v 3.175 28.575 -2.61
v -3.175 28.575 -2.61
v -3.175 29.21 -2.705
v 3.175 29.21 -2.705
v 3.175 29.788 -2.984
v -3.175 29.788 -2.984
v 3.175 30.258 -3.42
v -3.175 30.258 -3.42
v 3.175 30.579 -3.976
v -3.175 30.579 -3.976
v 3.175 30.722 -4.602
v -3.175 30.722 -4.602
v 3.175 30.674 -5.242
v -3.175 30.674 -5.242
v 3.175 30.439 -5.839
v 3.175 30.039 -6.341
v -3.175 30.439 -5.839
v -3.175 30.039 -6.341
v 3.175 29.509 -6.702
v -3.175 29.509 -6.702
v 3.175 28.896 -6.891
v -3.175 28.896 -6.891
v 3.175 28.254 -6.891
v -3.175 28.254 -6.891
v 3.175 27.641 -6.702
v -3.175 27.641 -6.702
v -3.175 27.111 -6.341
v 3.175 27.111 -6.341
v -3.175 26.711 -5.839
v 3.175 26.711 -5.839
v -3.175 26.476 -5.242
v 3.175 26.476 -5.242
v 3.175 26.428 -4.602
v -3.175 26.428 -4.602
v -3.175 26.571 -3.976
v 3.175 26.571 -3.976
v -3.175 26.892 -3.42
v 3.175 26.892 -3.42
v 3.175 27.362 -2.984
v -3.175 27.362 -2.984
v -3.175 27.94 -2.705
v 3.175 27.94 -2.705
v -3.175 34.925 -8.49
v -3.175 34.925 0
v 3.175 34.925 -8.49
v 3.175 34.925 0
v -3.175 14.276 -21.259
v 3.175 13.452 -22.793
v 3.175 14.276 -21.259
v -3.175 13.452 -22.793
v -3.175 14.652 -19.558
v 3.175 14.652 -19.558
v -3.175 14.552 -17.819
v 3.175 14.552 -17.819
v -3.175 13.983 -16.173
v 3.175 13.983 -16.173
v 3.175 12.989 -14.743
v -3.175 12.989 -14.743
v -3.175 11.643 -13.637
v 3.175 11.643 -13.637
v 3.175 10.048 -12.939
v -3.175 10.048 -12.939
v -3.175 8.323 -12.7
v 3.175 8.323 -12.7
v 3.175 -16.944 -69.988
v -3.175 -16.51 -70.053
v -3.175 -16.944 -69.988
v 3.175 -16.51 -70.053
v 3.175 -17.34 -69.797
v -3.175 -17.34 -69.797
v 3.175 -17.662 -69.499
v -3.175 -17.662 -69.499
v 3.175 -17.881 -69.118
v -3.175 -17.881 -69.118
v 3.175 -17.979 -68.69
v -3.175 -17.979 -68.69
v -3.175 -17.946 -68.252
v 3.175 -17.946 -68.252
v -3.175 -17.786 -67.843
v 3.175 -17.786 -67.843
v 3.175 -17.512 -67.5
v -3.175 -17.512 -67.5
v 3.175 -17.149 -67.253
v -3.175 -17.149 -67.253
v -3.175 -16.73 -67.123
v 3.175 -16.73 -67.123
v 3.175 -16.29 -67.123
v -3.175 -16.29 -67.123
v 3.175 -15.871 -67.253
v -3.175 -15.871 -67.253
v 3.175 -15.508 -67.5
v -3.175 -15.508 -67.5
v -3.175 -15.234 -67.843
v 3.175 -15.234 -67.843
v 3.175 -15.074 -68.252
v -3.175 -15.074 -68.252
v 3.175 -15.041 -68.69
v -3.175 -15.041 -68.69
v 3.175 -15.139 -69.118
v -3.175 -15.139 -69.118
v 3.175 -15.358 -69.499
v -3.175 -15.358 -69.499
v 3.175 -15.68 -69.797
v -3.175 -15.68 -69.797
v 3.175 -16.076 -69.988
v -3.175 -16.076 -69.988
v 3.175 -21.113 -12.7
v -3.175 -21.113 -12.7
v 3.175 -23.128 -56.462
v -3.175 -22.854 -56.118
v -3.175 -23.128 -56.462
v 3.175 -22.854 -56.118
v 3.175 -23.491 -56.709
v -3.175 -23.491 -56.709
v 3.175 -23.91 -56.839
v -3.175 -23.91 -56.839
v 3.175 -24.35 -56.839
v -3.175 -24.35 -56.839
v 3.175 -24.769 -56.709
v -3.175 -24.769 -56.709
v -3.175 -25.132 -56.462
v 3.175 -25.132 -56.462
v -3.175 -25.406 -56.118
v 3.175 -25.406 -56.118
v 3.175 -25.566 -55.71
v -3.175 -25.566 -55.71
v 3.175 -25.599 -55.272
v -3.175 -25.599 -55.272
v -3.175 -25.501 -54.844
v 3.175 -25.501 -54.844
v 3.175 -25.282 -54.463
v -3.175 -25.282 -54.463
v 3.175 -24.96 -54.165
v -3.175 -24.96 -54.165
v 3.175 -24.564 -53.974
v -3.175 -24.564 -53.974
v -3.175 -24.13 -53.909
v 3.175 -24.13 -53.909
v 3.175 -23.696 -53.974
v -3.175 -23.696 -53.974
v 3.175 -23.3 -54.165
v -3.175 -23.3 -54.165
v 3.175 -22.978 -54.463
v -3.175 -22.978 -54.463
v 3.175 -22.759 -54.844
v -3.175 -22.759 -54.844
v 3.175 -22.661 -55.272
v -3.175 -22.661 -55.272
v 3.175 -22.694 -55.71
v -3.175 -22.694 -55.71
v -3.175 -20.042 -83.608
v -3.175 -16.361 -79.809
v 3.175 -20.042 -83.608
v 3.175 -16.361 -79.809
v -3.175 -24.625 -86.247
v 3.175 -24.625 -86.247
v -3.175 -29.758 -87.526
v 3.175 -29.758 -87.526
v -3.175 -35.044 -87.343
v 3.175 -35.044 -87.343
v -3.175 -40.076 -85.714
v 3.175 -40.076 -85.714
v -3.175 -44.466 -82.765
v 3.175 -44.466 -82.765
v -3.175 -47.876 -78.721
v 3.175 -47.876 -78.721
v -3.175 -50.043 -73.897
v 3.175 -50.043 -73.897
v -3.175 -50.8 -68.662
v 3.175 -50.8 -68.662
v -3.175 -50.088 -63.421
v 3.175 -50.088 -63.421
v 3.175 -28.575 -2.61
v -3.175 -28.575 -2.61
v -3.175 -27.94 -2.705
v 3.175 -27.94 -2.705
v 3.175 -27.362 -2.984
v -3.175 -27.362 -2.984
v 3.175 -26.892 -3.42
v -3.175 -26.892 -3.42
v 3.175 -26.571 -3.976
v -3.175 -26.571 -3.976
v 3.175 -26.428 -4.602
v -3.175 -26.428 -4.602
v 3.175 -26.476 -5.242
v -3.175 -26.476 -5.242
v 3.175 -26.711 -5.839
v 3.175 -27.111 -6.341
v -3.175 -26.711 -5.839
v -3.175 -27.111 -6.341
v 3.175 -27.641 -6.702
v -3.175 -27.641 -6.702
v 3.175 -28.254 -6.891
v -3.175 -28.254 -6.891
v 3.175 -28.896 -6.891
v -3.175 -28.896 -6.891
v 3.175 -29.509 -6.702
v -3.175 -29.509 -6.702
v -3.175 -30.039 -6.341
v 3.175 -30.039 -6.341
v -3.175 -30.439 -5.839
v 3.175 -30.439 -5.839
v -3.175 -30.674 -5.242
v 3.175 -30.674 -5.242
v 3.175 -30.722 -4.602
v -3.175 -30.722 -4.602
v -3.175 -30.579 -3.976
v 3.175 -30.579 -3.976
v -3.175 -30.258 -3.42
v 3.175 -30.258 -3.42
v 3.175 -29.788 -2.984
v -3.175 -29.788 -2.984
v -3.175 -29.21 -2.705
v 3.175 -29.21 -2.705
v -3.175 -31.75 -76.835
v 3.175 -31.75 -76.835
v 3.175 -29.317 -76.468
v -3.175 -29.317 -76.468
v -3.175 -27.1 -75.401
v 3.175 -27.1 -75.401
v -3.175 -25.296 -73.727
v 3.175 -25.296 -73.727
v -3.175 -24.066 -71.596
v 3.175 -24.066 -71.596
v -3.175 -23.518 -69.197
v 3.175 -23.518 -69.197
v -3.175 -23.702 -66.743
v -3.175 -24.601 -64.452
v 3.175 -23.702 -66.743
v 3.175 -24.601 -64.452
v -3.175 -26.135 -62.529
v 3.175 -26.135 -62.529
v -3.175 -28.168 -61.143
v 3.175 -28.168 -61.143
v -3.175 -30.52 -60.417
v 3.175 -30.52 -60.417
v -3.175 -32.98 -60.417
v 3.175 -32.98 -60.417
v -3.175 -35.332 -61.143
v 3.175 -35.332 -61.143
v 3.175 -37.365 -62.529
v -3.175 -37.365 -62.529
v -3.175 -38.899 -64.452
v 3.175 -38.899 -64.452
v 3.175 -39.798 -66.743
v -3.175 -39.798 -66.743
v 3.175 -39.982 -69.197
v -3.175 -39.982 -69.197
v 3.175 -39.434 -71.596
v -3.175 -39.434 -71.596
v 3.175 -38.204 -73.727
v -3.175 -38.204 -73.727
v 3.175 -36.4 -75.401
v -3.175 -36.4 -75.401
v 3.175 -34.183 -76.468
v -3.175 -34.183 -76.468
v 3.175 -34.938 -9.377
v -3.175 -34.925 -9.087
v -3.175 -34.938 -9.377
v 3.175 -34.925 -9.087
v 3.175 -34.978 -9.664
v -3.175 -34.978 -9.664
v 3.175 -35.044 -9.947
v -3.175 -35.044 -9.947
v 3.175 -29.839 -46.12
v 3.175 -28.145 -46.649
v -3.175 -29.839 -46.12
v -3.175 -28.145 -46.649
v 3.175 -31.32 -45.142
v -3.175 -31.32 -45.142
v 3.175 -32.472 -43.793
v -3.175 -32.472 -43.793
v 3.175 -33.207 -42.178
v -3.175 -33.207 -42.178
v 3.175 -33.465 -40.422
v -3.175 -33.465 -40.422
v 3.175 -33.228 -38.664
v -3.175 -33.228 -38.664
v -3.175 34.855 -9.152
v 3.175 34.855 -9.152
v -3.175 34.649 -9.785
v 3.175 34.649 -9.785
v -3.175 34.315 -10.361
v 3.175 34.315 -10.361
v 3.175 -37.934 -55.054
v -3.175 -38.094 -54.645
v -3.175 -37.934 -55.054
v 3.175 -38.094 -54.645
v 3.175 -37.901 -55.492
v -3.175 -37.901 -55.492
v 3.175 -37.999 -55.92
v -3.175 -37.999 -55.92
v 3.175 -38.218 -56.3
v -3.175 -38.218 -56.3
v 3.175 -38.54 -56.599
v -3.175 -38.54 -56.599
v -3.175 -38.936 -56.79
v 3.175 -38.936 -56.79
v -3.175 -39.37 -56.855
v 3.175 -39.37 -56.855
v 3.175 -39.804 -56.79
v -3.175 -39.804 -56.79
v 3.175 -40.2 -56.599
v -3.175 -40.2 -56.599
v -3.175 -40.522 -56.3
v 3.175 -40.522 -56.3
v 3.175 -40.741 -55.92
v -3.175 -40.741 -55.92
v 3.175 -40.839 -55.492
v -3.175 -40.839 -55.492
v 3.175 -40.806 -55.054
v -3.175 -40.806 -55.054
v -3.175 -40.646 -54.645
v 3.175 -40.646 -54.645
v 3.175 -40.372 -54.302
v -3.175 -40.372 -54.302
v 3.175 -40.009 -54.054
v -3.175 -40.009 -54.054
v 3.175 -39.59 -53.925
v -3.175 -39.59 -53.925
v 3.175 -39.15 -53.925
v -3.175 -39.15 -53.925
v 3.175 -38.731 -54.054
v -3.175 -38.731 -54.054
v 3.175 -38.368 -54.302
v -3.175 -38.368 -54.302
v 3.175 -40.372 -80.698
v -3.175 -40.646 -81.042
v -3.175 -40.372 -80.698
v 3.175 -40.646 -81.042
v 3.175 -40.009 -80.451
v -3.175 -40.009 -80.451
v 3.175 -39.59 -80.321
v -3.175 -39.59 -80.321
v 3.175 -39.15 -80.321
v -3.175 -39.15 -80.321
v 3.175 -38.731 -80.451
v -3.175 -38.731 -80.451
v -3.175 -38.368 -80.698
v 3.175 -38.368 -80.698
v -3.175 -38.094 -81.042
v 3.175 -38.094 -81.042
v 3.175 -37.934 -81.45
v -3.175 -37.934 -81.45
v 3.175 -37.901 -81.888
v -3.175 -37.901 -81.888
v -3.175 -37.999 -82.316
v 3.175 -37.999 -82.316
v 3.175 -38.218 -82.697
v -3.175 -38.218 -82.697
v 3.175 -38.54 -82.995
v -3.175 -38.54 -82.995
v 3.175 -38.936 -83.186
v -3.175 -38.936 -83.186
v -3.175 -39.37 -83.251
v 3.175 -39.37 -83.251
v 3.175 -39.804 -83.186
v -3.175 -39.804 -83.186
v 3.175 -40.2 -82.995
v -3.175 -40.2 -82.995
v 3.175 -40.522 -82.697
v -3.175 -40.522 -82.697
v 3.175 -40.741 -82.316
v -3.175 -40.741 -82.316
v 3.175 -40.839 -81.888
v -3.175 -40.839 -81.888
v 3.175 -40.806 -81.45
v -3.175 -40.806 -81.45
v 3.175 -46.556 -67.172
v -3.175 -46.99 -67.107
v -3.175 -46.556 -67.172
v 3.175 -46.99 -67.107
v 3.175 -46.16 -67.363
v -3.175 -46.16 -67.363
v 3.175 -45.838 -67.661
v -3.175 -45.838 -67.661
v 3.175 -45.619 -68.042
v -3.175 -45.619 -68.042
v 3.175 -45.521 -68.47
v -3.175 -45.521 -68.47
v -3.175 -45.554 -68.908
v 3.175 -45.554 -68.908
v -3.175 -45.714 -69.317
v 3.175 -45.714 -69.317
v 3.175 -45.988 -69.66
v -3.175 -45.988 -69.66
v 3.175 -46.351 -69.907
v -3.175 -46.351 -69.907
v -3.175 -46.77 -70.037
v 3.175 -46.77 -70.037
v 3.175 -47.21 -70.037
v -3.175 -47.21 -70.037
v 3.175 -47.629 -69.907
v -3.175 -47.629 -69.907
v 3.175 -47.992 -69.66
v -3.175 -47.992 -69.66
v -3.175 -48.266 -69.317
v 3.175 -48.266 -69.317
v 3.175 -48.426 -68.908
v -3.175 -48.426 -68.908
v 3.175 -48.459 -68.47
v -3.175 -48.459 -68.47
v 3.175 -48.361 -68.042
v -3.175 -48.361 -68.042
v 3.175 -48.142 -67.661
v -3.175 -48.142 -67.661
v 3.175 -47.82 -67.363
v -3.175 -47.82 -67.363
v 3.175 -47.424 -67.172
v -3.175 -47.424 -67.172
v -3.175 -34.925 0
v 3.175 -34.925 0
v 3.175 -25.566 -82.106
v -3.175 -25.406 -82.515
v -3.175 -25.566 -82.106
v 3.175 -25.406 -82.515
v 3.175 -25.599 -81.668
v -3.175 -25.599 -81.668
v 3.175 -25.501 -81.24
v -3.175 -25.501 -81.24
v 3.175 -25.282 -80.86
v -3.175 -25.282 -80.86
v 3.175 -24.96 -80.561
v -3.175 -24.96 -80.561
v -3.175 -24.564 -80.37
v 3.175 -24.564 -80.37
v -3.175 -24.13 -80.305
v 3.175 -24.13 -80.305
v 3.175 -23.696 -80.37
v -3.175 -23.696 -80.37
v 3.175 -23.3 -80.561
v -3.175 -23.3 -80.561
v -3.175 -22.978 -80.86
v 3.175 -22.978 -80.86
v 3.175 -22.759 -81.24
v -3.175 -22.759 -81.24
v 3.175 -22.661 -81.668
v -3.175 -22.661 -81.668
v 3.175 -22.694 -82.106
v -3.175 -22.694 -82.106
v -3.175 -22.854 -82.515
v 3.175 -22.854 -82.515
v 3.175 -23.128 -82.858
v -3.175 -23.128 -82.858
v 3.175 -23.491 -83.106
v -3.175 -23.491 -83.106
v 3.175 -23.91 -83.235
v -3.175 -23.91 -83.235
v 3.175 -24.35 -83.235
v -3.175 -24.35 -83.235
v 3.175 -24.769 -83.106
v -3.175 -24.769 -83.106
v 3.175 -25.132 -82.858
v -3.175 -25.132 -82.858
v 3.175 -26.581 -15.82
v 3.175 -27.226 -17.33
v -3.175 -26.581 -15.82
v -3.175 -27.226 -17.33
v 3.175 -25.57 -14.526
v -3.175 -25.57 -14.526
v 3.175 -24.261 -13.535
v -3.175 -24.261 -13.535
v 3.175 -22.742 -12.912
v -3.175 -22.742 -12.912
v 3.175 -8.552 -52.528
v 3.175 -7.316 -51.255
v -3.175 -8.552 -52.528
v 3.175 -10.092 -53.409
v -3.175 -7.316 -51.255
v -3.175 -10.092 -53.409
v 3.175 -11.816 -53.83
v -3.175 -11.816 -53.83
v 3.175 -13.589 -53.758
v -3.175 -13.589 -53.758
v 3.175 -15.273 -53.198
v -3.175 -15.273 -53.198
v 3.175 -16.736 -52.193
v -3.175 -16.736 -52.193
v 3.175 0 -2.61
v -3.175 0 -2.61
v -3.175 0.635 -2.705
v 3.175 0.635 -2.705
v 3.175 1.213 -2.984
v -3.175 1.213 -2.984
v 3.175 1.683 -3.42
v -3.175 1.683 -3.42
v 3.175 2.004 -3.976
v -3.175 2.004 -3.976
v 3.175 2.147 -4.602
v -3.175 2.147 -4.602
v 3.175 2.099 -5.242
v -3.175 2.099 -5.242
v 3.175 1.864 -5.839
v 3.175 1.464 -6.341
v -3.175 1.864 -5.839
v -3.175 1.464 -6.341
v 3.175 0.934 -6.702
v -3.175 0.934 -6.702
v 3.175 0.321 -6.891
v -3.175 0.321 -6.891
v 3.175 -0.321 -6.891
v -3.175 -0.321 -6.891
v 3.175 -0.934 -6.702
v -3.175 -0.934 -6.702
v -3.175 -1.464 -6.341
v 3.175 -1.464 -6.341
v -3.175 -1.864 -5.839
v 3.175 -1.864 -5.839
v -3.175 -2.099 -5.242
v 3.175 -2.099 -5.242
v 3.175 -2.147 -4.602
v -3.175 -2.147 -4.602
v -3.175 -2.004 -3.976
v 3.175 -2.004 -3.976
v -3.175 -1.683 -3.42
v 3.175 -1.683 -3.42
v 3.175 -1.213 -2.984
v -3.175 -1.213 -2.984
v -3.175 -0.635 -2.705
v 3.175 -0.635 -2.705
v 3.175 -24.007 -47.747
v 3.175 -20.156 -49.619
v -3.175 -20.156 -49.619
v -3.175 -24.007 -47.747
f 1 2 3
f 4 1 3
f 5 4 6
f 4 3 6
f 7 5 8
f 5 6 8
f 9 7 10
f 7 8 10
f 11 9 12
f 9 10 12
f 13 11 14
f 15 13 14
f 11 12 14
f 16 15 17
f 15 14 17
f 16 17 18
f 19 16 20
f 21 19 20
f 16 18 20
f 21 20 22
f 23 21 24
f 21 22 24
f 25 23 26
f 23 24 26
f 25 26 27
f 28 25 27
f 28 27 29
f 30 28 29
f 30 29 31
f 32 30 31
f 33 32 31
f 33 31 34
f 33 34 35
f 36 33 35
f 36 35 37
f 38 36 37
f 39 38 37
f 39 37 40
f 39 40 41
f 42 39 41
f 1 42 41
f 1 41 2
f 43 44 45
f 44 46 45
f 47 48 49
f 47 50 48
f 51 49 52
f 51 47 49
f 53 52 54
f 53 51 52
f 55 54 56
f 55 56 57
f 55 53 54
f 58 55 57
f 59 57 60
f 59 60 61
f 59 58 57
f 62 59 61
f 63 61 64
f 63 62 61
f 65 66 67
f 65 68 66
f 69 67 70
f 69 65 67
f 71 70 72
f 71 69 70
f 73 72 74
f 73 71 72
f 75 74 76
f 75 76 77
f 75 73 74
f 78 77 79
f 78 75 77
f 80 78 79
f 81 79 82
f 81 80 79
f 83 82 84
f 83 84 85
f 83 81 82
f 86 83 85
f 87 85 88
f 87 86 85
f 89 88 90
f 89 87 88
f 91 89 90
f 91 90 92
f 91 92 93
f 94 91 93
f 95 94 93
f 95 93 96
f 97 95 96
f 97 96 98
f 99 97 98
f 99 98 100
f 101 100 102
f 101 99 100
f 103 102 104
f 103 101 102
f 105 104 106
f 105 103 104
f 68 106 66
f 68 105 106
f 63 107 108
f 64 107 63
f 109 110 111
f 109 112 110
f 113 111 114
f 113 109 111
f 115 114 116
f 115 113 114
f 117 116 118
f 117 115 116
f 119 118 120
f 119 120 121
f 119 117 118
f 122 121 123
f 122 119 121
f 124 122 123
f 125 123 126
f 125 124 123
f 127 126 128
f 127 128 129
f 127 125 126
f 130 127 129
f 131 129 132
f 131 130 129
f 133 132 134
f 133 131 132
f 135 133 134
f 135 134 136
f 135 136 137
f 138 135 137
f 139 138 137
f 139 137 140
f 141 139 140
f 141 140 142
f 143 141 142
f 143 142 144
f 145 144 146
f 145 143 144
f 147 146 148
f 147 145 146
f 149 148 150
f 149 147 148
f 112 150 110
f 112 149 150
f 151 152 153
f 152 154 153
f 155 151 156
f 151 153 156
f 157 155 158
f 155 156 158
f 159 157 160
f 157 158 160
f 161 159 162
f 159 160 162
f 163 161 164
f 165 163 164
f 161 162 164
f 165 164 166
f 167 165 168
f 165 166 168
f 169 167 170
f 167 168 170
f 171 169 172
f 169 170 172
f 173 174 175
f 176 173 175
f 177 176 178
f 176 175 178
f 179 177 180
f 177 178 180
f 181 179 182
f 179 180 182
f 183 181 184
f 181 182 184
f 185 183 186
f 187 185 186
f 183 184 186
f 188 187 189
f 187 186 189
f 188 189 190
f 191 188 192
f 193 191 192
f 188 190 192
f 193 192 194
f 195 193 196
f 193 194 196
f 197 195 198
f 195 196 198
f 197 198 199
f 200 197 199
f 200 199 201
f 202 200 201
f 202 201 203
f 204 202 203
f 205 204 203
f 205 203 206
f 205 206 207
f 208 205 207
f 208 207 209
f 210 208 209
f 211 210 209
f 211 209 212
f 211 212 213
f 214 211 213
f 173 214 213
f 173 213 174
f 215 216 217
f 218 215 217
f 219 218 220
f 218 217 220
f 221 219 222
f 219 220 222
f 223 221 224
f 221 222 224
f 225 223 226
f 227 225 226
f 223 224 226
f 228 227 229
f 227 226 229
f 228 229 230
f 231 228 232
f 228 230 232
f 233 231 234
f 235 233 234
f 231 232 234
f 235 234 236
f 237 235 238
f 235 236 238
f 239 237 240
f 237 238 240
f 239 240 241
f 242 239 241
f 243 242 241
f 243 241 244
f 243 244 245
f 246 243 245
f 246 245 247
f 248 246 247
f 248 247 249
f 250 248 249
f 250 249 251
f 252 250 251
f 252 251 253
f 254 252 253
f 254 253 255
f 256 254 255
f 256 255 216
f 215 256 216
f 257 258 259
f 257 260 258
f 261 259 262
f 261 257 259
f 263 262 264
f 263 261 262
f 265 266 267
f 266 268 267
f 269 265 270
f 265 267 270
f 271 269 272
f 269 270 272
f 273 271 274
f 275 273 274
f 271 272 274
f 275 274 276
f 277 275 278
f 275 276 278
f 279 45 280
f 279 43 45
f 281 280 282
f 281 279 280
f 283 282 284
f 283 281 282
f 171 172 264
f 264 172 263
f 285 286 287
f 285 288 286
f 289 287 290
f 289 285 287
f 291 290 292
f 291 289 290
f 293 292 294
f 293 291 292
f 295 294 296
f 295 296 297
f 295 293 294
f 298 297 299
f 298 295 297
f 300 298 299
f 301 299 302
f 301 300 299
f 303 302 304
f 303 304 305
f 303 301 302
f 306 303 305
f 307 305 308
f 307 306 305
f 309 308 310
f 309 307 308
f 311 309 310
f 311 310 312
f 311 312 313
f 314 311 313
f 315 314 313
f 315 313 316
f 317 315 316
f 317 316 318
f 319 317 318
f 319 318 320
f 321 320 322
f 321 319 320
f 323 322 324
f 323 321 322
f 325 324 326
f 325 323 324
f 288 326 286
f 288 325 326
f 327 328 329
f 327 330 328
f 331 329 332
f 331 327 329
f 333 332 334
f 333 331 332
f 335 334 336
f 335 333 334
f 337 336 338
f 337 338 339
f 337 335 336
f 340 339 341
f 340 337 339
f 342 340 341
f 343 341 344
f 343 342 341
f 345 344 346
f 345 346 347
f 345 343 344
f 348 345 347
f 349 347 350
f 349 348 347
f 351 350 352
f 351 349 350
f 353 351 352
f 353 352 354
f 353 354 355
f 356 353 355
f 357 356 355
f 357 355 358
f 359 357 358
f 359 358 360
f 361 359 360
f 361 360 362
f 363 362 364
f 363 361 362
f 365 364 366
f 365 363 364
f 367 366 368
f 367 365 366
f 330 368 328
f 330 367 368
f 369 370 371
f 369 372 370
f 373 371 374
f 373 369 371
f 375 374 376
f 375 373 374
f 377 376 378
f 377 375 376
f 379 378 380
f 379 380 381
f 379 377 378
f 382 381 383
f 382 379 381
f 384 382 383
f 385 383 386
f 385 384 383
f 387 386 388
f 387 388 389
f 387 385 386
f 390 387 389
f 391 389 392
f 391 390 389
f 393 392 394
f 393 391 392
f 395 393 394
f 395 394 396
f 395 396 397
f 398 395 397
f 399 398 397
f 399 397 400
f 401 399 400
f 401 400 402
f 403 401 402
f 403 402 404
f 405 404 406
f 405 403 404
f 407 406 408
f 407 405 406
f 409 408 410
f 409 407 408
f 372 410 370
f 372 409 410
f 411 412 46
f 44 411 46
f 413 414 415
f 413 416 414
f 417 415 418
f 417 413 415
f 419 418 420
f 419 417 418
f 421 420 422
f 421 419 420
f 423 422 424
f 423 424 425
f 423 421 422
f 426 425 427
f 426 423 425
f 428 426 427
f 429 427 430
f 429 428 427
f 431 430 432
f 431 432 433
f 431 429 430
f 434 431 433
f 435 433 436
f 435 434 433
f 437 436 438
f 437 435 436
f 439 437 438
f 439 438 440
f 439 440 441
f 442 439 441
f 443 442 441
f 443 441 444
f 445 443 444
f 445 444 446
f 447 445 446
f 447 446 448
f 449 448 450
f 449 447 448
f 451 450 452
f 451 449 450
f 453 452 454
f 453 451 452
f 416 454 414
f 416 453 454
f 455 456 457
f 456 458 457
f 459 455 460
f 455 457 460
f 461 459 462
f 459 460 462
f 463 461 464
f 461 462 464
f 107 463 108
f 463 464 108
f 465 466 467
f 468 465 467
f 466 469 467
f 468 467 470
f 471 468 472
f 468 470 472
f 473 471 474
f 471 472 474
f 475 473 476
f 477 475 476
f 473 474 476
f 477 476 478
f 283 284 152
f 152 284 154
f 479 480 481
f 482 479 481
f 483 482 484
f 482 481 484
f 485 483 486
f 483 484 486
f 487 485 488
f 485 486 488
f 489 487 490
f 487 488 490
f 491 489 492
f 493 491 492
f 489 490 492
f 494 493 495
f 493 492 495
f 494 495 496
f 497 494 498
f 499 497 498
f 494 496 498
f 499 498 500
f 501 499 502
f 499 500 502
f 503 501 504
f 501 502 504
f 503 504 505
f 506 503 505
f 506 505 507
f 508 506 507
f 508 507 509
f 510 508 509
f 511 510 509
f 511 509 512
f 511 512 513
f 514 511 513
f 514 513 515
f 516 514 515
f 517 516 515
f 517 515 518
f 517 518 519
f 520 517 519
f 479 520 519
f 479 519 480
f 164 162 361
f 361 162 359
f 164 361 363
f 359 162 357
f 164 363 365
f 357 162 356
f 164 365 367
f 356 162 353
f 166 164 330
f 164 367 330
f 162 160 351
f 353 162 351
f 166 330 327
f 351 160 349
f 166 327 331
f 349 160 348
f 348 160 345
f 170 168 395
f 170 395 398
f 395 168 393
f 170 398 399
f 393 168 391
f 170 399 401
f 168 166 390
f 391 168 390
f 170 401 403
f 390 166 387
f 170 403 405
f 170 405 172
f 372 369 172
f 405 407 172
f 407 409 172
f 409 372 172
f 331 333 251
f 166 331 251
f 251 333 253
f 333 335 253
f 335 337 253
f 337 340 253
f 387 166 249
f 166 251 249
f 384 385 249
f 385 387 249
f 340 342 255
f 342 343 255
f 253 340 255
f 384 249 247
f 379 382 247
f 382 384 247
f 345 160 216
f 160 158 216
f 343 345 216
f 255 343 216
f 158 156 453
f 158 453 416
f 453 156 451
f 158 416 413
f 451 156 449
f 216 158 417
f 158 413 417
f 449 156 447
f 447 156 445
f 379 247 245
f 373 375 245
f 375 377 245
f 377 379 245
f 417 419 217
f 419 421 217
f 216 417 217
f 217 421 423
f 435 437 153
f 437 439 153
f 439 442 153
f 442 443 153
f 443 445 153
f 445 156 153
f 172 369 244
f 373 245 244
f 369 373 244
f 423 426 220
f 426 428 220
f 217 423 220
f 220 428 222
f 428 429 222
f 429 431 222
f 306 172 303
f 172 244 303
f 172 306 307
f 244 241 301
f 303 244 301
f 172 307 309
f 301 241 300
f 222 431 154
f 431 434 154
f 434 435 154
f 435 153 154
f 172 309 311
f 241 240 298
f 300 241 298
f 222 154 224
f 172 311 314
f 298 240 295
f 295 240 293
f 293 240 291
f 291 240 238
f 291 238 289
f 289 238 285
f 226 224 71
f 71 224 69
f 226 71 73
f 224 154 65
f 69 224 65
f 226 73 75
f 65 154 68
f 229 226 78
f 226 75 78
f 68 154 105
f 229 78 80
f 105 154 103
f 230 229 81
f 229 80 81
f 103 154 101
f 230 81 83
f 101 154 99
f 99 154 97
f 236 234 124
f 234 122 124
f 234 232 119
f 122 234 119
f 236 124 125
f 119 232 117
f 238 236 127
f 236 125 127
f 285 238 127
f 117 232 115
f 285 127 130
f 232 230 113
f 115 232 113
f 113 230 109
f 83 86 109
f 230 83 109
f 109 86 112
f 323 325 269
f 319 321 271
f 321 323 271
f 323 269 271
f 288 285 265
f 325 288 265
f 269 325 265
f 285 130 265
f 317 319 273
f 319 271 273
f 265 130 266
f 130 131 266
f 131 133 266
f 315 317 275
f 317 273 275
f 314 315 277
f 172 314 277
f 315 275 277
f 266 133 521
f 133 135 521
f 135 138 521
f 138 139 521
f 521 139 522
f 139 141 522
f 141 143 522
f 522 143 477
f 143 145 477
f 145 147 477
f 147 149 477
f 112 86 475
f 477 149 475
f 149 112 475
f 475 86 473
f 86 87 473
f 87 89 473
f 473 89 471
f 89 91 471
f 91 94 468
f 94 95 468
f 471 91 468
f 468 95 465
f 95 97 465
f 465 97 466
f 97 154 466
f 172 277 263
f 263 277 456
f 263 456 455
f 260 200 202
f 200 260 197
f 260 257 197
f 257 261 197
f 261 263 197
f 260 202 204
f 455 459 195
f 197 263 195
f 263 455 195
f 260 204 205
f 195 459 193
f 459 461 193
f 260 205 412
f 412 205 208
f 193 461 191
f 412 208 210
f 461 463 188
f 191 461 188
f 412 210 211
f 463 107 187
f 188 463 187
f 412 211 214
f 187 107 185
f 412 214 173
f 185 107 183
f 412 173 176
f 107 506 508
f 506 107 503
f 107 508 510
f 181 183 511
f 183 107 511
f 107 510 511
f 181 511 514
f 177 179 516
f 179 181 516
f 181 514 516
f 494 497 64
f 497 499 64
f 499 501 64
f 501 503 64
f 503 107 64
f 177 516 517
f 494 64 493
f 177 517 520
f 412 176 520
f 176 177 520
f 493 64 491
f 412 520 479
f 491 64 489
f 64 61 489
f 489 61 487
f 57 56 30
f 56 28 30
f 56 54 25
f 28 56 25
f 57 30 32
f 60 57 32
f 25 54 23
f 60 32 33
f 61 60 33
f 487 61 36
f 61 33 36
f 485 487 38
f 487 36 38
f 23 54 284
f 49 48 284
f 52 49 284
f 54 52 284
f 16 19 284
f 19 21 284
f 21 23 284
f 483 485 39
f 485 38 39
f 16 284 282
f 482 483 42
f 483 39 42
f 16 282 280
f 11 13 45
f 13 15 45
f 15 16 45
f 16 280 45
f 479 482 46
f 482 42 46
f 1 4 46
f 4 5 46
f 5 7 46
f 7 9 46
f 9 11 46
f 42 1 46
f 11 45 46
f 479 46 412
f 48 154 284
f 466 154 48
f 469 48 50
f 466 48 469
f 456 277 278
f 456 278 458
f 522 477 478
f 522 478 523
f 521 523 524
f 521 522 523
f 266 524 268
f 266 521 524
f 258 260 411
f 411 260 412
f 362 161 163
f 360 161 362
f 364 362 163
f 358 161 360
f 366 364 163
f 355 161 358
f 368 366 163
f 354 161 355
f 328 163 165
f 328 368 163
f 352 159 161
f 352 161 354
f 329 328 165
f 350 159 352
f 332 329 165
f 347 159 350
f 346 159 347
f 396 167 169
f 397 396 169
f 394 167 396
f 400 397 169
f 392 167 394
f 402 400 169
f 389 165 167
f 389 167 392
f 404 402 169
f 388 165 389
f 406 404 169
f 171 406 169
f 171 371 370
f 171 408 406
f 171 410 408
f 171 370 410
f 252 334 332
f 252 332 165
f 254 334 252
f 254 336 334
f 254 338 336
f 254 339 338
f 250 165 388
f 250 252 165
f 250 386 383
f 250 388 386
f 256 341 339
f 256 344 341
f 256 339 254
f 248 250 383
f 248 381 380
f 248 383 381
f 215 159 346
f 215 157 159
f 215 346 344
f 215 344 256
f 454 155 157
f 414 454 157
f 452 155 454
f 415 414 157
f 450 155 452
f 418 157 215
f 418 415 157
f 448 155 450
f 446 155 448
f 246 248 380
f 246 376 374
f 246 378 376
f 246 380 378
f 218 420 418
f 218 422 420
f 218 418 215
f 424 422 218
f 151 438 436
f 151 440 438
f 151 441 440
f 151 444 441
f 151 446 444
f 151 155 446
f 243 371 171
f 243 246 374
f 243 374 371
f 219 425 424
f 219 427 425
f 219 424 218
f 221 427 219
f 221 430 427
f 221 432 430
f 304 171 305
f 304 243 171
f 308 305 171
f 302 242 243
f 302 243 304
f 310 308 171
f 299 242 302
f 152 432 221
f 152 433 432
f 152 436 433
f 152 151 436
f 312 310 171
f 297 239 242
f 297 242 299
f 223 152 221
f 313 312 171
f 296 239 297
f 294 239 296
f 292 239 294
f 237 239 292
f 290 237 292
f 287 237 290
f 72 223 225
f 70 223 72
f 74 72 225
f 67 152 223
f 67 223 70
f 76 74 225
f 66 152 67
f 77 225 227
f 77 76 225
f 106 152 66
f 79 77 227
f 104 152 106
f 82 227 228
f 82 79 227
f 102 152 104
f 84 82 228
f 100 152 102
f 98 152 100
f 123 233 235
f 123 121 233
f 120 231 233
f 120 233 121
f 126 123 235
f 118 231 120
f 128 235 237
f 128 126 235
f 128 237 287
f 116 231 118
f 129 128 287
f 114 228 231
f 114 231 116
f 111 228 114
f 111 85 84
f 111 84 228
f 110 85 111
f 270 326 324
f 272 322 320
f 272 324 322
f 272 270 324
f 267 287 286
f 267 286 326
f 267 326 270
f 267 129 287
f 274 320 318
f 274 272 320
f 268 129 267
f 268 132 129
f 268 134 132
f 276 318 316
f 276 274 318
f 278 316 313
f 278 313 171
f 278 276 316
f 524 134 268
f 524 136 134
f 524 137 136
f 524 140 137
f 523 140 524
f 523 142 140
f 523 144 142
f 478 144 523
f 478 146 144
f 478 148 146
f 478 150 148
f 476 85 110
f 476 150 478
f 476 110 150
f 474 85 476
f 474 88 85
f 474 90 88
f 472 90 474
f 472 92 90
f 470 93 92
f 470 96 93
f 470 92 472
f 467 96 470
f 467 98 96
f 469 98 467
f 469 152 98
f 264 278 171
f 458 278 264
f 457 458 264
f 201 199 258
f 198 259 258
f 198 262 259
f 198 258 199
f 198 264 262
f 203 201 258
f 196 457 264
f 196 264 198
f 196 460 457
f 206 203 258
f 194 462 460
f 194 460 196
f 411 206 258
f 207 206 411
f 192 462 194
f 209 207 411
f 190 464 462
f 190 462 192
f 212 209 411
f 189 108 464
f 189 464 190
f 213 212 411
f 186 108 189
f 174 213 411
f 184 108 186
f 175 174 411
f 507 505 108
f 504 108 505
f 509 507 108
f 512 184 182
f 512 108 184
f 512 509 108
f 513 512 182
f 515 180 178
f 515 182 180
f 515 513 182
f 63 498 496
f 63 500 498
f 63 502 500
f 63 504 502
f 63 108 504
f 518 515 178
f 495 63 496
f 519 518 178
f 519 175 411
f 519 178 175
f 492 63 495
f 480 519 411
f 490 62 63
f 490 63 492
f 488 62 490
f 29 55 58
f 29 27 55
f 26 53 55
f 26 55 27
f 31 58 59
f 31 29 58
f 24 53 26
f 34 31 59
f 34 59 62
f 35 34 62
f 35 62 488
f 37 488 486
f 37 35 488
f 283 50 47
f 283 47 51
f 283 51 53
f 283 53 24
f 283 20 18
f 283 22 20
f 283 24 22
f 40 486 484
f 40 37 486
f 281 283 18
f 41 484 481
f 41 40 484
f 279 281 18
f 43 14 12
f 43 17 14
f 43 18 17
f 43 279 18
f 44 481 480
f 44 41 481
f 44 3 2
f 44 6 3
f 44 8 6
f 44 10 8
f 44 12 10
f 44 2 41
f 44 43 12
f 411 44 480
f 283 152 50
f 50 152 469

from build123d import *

# Parameters (mm, degrees)
BOSS_EXTRUDE1_DEPTH   = 3.175
SKETCH2_R             = 8.255
CUT_EXTRUDE1_DEPTH    = 102.488814162
F_8_CLEARANCE_HOLE1_D = 4.3053
CIRPATTERN1_COUNT     = 6
FILLET1_R             = 3.175
CUT_EXTRUDE2_DEPTH    = 102.488814162
FILLET2_R             = 6.35


with BuildPart() as part:
    # Sketch1 → Boss-Extrude1 (new, symmetric)
    with BuildSketch(Plane(origin=(0, 0, 0), x_dir=(0, 0, -1), z_dir=(1, 0, 0))):
        with BuildLine():
            Line((0, -34.925), (0, 34.925))
            Line((0, 34.925), (9.525, 34.925))
            Line((9.525, 34.925), (79.8090967, -16.361371494))
            ThreePointArc((79.8090967, -16.361371494), (85.714272022, -40.075816614), (63.420756295, -50.088067084))
            Line((63.420756295, -50.088067084), (9.525, -34.925))
            Line((9.525, -34.925), (0, -34.925))
        make_face()
    extrude(amount=BOSS_EXTRUDE1_DEPTH, both=True)

    # Sketch2 → Cut-Extrude1 (cut, through all)
    with BuildSketch(Plane(origin=(3.175, 0, 0), x_dir=(0, 0, -1), z_dir=(1, 0, 0))):
        with Locations((68.58, -31.75)):
            Circle(SKETCH2_R)
    extrude(amount=-CUT_EXTRUDE1_DEPTH, mode=Mode.SUBTRACT)

    # #8 Clearance Hole1 (through all)
    with Locations(Plane(origin=(3.175, 0, 0), x_dir=(0, 0, -1), z_dir=(1, 0, 0))):
        with Locations((4.7625, 0), (4.7625, 28.575), (4.7625, -28.575)):
            Hole(F_8_CLEARANCE_HOLE1_D / 2)

    # Sketch6 → #4 Clearance Hole1 (revolve, cut)
    with BuildSketch(Plane(origin=(3.175, -16.51, -68.58), x_dir=(0, 0, -1), z_dir=(0, 1, 0))):
        Polygon((0, 0), (0, 7.235187864), (1.4732, 6.35), (1.4732, 0), align=None)
    f_4_clearance_hole1 = revolve(axis=Axis((9.525, -16.51, -68.58), (-1, 0, 0)), mode=Mode.SUBTRACT)

    # CirPattern1: #4 Clearance Hole1 ×6 about axis
    cirpattern1_axis = Axis((0, -31.75, -68.58), (1, 0, 0))
    for i in range(1, CIRPATTERN1_COUNT):
        add(f_4_clearance_hole1.rotate(cirpattern1_axis, i * 360 / CIRPATTERN1_COUNT), mode=Mode.SUBTRACT)

    # Fillet1
    fillet1_edges = [part.edges().sort_by_distance(p)[0] for p in [
        (0, 34.925, -9.525),
        (0, -34.925, -9.525),
    ]]
    fillet(fillet1_edges, radius=FILLET1_R)

    # Sketch8 → Cut-Extrude2 (cut, through all)
    with BuildSketch(Plane(origin=(3.175, 0, 0), x_dir=(0, 0, -1), z_dir=(1, 0, 0))):
        with BuildLine():
            Line((12.7, -25.923470533), (12.7, 20.816944046))
            Line((12.7, 20.816944046), (57.973509635, -12.219178534))
            ThreePointArc((57.973509635, -12.219178534), (48.590015975, -22.036547283), (46.67035819, -35.480713171))
            Line((46.67035819, -35.480713171), (12.7, -25.923470533))
        make_face()
    extrude(amount=-CUT_EXTRUDE2_DEPTH, mode=Mode.SUBTRACT)

    # Fillet2
    fillet2_edges = [part.edges().sort_by_distance(p)[0] for p in [
        (0, -35.480713171, -46.67035819),
        (0, -25.923470533, -12.7),
        (0, 20.816944046, -12.7),
        (0, -12.219178534, -57.973509635),
    ]]
    fillet(fillet2_edges, radius=FILLET2_R)


solid = part.part
